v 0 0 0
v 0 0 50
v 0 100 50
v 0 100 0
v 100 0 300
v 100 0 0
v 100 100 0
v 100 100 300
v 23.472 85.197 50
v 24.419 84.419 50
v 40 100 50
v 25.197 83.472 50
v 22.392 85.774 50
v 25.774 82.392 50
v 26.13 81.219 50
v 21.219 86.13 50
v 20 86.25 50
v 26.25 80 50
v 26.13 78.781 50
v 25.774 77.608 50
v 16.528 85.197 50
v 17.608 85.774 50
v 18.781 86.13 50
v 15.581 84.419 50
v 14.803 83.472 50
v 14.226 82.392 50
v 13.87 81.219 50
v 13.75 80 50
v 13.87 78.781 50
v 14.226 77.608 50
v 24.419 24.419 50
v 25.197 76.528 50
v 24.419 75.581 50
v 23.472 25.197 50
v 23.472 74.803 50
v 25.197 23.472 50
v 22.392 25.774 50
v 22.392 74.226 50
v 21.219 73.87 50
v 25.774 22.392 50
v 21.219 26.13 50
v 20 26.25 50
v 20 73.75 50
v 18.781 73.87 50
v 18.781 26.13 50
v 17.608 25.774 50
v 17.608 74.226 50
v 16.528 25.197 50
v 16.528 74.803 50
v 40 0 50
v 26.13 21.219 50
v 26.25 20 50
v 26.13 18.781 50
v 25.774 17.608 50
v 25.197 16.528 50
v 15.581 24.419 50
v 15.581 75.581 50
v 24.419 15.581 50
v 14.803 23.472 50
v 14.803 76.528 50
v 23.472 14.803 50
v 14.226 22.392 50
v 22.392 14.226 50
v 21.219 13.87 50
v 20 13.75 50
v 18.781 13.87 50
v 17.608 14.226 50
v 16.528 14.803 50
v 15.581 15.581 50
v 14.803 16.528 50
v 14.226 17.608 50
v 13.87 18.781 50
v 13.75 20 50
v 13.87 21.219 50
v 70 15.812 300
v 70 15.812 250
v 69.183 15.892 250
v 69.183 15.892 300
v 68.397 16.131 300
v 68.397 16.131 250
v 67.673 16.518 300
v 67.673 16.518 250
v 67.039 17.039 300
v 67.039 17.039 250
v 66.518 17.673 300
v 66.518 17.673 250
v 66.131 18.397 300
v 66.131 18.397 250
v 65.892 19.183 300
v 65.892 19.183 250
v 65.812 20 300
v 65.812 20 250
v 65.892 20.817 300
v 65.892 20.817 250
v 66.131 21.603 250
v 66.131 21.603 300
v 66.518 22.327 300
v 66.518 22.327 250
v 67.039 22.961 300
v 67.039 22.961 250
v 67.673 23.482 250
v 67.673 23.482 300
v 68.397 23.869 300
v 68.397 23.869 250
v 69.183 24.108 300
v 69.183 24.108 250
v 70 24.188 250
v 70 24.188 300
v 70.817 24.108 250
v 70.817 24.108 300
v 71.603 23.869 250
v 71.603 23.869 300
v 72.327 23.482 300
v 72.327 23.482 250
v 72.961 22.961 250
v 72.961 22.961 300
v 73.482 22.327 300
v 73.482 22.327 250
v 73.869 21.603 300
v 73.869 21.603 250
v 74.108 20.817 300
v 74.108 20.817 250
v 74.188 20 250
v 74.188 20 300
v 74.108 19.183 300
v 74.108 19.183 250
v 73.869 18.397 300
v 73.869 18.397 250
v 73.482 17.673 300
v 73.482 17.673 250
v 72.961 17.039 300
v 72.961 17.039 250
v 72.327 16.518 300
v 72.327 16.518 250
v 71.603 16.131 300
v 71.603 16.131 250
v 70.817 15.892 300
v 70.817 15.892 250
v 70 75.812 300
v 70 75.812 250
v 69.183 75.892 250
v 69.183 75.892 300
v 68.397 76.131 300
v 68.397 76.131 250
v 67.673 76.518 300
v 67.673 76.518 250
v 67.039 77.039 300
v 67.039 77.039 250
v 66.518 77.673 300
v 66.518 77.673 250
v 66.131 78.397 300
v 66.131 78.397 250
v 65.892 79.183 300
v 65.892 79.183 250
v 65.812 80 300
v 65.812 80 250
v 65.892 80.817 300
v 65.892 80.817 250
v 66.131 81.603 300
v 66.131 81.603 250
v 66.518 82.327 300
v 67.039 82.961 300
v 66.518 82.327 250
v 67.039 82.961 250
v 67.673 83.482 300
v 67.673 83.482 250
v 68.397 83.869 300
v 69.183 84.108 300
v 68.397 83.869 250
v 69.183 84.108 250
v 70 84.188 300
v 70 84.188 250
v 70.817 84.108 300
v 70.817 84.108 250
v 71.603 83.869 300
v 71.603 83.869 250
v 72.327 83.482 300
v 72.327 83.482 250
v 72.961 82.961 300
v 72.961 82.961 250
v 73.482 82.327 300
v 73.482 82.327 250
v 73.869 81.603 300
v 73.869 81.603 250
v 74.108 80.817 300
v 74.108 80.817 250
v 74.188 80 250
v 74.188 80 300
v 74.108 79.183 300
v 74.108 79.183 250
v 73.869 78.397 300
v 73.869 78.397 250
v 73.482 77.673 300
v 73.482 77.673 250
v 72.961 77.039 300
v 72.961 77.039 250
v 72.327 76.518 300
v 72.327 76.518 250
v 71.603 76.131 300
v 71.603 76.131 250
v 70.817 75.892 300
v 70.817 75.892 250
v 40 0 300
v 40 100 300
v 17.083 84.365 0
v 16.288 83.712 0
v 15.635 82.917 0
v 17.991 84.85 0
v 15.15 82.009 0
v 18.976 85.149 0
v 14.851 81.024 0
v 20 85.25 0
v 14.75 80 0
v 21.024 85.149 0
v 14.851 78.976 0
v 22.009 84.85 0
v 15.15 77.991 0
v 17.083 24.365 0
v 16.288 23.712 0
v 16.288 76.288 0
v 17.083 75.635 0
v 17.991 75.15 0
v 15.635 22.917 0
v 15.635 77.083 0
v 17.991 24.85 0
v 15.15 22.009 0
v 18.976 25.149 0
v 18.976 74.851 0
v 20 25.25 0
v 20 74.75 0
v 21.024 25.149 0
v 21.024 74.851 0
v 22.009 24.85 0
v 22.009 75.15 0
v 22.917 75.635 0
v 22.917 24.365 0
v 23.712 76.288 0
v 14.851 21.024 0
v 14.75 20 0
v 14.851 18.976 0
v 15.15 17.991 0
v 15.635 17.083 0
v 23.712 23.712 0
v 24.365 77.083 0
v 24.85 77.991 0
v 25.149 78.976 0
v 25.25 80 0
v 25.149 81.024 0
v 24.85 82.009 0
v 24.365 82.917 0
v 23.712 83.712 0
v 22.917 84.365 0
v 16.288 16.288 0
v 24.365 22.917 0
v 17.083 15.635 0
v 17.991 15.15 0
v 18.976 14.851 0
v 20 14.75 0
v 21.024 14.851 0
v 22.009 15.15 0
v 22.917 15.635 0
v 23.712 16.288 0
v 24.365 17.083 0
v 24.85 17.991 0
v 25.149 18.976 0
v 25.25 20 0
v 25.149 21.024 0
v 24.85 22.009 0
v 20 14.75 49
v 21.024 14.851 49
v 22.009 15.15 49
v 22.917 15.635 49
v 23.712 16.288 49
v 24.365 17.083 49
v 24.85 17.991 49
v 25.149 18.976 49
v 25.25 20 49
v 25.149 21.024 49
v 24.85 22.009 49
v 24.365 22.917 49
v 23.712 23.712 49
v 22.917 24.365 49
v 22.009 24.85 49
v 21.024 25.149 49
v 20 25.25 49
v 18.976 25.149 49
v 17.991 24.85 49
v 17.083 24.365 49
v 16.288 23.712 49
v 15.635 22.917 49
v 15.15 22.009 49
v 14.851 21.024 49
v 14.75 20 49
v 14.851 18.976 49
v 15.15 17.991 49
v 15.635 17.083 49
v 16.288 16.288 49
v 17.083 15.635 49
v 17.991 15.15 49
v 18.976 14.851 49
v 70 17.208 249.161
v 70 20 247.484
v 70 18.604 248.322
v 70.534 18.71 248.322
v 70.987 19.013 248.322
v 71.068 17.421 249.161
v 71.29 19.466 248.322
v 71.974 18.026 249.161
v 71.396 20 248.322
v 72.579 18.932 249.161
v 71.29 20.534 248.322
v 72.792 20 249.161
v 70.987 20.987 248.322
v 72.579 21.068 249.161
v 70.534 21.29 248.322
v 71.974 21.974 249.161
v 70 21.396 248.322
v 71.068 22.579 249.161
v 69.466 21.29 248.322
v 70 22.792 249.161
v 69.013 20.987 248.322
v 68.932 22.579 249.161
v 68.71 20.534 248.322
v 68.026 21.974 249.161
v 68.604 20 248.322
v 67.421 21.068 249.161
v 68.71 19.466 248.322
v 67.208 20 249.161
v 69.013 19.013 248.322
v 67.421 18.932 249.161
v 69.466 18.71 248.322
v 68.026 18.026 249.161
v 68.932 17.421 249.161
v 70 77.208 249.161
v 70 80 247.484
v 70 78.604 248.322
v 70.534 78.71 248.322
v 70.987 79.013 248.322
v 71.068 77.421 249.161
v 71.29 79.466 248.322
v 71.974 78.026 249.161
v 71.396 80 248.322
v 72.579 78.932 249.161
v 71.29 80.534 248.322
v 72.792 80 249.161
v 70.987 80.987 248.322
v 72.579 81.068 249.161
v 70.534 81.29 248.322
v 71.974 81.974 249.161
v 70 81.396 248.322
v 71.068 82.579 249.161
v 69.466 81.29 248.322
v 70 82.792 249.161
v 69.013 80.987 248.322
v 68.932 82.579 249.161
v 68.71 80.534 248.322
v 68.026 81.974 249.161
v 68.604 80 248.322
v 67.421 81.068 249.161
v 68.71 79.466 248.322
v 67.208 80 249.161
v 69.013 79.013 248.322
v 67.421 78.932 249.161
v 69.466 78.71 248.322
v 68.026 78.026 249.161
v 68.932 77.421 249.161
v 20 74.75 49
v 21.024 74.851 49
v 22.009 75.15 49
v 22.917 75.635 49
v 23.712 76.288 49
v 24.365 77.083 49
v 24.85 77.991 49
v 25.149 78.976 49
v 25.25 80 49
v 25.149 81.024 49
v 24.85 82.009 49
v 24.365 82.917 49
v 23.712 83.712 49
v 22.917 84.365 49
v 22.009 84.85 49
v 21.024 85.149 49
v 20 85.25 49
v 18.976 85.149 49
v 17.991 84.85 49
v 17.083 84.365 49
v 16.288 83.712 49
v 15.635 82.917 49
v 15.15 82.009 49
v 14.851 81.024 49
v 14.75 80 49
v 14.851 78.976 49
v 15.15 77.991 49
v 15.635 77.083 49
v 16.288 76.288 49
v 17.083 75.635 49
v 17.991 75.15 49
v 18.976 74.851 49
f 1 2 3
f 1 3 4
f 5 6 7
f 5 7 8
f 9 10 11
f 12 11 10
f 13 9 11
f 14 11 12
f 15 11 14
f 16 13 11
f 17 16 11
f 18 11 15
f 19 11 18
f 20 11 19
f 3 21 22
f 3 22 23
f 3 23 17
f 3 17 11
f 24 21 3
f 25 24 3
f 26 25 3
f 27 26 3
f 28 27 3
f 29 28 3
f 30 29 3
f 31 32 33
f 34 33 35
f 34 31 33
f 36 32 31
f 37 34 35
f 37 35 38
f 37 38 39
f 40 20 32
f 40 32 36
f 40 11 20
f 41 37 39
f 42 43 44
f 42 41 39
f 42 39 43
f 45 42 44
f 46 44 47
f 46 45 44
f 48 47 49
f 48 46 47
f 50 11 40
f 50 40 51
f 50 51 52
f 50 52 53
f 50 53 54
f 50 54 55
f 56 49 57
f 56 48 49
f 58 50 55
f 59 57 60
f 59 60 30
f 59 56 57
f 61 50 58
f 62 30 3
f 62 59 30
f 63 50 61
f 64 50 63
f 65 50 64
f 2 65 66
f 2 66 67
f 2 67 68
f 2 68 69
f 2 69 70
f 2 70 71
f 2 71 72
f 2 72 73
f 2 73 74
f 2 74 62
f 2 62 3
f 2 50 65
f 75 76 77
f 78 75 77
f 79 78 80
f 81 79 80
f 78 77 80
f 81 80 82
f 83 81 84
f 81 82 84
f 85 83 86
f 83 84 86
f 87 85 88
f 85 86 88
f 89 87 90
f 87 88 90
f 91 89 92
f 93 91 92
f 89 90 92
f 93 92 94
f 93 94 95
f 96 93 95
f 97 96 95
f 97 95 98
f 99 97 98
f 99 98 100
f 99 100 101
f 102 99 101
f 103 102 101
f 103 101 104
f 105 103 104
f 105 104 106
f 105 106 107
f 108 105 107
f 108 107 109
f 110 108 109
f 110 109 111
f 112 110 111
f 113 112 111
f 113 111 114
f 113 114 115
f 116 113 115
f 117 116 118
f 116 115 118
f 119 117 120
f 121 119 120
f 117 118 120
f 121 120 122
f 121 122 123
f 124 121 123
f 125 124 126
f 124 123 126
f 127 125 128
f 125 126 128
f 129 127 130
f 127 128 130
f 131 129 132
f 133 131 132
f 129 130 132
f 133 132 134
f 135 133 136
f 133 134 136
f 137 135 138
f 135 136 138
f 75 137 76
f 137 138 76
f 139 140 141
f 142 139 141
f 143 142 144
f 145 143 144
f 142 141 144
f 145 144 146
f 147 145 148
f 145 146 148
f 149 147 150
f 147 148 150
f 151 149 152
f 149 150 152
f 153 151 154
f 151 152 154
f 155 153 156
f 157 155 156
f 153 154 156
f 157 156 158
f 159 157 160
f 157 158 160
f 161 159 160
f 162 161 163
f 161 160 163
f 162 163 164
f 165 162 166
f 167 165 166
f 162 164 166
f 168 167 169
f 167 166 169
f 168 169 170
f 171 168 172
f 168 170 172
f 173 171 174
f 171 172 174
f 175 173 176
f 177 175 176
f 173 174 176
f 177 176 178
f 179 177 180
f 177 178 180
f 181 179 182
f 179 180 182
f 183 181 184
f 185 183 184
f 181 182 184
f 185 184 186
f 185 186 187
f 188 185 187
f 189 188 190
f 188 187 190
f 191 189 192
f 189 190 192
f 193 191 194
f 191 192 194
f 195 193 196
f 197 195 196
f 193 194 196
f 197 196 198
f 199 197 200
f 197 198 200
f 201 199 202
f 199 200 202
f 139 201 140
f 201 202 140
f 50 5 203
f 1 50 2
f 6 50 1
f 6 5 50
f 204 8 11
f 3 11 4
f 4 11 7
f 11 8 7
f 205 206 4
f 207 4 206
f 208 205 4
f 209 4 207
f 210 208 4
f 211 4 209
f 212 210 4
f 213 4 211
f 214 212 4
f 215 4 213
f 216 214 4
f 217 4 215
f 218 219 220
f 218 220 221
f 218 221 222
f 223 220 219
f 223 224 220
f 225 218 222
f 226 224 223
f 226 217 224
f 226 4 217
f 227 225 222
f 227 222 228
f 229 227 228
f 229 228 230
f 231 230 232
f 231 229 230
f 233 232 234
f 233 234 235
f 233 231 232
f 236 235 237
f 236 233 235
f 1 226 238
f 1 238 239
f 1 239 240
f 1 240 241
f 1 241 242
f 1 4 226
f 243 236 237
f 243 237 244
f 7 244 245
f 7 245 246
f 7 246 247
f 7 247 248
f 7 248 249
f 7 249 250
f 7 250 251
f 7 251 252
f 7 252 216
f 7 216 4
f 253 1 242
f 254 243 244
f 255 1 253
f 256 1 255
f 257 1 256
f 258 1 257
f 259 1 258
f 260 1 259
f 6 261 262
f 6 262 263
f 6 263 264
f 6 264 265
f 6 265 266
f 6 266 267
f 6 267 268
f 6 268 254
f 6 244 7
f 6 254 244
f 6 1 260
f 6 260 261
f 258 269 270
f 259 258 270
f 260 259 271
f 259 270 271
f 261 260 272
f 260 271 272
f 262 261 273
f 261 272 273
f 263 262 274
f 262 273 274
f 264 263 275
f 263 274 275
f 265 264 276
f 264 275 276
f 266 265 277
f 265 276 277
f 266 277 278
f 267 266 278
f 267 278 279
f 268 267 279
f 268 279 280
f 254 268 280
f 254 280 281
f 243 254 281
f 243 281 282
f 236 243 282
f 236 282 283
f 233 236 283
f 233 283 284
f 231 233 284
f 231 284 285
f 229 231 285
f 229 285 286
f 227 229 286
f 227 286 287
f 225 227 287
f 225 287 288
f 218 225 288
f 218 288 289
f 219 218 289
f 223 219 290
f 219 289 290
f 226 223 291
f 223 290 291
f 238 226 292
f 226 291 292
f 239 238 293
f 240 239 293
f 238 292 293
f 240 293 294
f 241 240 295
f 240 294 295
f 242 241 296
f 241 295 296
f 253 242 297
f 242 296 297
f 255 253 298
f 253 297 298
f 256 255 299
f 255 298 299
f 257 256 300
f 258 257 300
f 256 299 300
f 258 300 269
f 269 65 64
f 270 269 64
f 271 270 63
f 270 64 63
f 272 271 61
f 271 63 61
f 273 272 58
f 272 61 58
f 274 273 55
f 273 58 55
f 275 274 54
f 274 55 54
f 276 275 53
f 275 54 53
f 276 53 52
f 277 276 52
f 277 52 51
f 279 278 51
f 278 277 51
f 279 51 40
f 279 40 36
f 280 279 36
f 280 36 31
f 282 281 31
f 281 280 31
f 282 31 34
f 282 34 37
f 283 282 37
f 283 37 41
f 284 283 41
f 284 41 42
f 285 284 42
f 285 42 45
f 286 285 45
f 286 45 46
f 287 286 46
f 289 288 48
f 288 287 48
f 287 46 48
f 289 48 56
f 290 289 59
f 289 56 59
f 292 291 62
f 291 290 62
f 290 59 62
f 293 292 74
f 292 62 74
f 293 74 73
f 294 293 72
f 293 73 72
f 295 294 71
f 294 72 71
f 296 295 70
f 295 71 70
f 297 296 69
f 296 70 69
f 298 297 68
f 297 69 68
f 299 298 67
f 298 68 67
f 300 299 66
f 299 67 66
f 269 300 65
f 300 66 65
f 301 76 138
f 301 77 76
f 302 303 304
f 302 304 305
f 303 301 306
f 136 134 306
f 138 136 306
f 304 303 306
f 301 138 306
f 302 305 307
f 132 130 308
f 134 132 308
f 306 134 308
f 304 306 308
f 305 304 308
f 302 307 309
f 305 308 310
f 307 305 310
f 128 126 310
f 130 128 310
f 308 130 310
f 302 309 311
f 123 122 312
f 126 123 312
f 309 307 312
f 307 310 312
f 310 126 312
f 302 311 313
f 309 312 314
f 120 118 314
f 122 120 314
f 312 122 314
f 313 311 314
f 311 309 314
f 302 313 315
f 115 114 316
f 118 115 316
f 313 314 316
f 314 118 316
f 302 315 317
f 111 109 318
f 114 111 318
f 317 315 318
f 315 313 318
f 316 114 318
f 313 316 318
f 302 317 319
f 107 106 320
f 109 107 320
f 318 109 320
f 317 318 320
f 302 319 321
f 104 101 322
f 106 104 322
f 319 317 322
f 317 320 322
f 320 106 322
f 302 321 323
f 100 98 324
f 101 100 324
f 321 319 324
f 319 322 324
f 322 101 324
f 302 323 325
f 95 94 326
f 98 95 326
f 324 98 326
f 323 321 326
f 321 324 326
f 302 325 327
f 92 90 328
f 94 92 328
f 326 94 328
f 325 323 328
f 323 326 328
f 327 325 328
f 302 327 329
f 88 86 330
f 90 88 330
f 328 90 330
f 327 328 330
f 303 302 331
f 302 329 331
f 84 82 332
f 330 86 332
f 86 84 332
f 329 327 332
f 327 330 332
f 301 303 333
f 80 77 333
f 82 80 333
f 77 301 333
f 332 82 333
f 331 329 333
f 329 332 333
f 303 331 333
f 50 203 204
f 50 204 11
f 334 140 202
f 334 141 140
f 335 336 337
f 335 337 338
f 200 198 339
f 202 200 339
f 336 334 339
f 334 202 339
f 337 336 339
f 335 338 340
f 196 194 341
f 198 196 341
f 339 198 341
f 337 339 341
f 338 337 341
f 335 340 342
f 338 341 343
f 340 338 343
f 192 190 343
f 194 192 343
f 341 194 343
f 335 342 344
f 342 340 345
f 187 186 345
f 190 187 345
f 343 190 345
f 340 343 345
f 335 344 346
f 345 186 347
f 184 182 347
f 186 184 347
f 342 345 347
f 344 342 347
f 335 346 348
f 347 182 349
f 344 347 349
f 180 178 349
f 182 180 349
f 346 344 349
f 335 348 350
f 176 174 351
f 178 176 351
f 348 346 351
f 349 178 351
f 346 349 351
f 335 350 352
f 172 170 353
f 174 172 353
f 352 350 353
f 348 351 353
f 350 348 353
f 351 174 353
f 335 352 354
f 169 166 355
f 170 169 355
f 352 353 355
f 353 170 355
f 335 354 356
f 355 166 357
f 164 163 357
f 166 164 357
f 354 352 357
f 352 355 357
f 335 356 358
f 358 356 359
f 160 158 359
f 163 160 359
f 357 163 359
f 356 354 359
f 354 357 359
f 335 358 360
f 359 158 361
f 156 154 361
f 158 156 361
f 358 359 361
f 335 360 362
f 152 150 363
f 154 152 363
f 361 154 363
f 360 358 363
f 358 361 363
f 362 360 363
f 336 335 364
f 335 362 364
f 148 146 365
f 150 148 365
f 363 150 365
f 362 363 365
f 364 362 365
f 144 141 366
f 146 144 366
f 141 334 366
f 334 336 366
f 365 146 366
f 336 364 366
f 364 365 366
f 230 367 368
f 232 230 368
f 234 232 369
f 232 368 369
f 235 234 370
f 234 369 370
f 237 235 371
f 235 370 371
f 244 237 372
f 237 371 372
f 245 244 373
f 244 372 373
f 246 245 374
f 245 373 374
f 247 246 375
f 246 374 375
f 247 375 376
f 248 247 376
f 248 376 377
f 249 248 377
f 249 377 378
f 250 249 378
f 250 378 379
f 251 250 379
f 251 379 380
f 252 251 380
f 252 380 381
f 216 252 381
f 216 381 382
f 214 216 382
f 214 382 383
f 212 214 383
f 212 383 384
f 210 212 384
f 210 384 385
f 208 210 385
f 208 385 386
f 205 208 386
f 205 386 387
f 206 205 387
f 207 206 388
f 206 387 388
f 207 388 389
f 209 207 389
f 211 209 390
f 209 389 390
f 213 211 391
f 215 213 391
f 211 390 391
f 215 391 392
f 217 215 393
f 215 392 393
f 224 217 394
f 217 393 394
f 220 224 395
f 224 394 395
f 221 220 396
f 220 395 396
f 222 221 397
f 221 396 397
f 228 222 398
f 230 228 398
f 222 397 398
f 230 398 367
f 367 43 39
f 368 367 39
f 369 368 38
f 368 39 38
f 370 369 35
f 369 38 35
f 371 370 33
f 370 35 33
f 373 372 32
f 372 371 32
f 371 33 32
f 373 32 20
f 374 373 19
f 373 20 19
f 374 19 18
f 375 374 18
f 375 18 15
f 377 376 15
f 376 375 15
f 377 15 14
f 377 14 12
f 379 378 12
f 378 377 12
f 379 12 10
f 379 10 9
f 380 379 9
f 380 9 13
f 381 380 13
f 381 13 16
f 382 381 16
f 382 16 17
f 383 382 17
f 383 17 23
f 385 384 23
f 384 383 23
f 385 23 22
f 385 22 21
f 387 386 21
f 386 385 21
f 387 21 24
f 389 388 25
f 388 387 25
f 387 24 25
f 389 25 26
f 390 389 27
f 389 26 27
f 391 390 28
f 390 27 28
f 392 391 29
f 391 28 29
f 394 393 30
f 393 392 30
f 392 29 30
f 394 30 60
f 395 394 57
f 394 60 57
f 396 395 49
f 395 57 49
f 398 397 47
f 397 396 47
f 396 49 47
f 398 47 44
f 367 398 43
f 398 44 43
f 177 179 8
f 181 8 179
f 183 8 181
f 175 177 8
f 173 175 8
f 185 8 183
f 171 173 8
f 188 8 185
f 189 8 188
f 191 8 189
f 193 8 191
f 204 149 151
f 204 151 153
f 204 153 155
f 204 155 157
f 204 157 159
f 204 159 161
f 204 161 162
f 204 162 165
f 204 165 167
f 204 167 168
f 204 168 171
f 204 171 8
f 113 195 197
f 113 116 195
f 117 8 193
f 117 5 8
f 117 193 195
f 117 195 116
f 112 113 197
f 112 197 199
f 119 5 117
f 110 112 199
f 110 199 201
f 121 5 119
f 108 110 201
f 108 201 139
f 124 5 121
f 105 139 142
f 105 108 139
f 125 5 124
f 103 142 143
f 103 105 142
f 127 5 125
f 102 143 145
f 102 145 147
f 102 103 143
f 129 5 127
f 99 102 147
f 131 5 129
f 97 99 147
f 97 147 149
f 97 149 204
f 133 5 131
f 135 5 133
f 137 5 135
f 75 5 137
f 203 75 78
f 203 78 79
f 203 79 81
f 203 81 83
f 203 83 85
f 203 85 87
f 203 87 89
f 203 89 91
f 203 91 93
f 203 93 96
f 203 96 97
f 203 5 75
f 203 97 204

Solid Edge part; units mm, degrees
sketch "Sketch1" plane through (0, 0, 0) normal (0, -1, 0) x (1, 0, 0)
  line L0 (100, 0) -> (100, 300)
  line L1 (100, 300) -> (40, 300)
  line L2 (40, 300) -> (40, 50)
  line L3 (40, 50) -> (0, 50)
  line L4 (0, 50) -> (0, 0)
  line L5 (0, 0) -> (100, 0)
extrude "Protrusion1" add sketch "Sketch1" against normal blind 100
hole "Bohrung_1" at (20, 20, 50) direction (0, 0, -1) diameter 10.5 end up to next start chamfer 1 start chamfer angle 45
hole "Hole1" at (20, 80, 50) direction (0, 0, -1) diameter 10.5 end up to next start chamfer 1 start chamfer angle 45
hole "Bohrung_3" at (70, 20, 300) direction (0, 0, -1) diameter 8.376 depth 50 tip angle 118
hole "Hole2" at (70, 80, 300) direction (0, 0, -1) diameter 8.376 depth 50 tip angle 118
